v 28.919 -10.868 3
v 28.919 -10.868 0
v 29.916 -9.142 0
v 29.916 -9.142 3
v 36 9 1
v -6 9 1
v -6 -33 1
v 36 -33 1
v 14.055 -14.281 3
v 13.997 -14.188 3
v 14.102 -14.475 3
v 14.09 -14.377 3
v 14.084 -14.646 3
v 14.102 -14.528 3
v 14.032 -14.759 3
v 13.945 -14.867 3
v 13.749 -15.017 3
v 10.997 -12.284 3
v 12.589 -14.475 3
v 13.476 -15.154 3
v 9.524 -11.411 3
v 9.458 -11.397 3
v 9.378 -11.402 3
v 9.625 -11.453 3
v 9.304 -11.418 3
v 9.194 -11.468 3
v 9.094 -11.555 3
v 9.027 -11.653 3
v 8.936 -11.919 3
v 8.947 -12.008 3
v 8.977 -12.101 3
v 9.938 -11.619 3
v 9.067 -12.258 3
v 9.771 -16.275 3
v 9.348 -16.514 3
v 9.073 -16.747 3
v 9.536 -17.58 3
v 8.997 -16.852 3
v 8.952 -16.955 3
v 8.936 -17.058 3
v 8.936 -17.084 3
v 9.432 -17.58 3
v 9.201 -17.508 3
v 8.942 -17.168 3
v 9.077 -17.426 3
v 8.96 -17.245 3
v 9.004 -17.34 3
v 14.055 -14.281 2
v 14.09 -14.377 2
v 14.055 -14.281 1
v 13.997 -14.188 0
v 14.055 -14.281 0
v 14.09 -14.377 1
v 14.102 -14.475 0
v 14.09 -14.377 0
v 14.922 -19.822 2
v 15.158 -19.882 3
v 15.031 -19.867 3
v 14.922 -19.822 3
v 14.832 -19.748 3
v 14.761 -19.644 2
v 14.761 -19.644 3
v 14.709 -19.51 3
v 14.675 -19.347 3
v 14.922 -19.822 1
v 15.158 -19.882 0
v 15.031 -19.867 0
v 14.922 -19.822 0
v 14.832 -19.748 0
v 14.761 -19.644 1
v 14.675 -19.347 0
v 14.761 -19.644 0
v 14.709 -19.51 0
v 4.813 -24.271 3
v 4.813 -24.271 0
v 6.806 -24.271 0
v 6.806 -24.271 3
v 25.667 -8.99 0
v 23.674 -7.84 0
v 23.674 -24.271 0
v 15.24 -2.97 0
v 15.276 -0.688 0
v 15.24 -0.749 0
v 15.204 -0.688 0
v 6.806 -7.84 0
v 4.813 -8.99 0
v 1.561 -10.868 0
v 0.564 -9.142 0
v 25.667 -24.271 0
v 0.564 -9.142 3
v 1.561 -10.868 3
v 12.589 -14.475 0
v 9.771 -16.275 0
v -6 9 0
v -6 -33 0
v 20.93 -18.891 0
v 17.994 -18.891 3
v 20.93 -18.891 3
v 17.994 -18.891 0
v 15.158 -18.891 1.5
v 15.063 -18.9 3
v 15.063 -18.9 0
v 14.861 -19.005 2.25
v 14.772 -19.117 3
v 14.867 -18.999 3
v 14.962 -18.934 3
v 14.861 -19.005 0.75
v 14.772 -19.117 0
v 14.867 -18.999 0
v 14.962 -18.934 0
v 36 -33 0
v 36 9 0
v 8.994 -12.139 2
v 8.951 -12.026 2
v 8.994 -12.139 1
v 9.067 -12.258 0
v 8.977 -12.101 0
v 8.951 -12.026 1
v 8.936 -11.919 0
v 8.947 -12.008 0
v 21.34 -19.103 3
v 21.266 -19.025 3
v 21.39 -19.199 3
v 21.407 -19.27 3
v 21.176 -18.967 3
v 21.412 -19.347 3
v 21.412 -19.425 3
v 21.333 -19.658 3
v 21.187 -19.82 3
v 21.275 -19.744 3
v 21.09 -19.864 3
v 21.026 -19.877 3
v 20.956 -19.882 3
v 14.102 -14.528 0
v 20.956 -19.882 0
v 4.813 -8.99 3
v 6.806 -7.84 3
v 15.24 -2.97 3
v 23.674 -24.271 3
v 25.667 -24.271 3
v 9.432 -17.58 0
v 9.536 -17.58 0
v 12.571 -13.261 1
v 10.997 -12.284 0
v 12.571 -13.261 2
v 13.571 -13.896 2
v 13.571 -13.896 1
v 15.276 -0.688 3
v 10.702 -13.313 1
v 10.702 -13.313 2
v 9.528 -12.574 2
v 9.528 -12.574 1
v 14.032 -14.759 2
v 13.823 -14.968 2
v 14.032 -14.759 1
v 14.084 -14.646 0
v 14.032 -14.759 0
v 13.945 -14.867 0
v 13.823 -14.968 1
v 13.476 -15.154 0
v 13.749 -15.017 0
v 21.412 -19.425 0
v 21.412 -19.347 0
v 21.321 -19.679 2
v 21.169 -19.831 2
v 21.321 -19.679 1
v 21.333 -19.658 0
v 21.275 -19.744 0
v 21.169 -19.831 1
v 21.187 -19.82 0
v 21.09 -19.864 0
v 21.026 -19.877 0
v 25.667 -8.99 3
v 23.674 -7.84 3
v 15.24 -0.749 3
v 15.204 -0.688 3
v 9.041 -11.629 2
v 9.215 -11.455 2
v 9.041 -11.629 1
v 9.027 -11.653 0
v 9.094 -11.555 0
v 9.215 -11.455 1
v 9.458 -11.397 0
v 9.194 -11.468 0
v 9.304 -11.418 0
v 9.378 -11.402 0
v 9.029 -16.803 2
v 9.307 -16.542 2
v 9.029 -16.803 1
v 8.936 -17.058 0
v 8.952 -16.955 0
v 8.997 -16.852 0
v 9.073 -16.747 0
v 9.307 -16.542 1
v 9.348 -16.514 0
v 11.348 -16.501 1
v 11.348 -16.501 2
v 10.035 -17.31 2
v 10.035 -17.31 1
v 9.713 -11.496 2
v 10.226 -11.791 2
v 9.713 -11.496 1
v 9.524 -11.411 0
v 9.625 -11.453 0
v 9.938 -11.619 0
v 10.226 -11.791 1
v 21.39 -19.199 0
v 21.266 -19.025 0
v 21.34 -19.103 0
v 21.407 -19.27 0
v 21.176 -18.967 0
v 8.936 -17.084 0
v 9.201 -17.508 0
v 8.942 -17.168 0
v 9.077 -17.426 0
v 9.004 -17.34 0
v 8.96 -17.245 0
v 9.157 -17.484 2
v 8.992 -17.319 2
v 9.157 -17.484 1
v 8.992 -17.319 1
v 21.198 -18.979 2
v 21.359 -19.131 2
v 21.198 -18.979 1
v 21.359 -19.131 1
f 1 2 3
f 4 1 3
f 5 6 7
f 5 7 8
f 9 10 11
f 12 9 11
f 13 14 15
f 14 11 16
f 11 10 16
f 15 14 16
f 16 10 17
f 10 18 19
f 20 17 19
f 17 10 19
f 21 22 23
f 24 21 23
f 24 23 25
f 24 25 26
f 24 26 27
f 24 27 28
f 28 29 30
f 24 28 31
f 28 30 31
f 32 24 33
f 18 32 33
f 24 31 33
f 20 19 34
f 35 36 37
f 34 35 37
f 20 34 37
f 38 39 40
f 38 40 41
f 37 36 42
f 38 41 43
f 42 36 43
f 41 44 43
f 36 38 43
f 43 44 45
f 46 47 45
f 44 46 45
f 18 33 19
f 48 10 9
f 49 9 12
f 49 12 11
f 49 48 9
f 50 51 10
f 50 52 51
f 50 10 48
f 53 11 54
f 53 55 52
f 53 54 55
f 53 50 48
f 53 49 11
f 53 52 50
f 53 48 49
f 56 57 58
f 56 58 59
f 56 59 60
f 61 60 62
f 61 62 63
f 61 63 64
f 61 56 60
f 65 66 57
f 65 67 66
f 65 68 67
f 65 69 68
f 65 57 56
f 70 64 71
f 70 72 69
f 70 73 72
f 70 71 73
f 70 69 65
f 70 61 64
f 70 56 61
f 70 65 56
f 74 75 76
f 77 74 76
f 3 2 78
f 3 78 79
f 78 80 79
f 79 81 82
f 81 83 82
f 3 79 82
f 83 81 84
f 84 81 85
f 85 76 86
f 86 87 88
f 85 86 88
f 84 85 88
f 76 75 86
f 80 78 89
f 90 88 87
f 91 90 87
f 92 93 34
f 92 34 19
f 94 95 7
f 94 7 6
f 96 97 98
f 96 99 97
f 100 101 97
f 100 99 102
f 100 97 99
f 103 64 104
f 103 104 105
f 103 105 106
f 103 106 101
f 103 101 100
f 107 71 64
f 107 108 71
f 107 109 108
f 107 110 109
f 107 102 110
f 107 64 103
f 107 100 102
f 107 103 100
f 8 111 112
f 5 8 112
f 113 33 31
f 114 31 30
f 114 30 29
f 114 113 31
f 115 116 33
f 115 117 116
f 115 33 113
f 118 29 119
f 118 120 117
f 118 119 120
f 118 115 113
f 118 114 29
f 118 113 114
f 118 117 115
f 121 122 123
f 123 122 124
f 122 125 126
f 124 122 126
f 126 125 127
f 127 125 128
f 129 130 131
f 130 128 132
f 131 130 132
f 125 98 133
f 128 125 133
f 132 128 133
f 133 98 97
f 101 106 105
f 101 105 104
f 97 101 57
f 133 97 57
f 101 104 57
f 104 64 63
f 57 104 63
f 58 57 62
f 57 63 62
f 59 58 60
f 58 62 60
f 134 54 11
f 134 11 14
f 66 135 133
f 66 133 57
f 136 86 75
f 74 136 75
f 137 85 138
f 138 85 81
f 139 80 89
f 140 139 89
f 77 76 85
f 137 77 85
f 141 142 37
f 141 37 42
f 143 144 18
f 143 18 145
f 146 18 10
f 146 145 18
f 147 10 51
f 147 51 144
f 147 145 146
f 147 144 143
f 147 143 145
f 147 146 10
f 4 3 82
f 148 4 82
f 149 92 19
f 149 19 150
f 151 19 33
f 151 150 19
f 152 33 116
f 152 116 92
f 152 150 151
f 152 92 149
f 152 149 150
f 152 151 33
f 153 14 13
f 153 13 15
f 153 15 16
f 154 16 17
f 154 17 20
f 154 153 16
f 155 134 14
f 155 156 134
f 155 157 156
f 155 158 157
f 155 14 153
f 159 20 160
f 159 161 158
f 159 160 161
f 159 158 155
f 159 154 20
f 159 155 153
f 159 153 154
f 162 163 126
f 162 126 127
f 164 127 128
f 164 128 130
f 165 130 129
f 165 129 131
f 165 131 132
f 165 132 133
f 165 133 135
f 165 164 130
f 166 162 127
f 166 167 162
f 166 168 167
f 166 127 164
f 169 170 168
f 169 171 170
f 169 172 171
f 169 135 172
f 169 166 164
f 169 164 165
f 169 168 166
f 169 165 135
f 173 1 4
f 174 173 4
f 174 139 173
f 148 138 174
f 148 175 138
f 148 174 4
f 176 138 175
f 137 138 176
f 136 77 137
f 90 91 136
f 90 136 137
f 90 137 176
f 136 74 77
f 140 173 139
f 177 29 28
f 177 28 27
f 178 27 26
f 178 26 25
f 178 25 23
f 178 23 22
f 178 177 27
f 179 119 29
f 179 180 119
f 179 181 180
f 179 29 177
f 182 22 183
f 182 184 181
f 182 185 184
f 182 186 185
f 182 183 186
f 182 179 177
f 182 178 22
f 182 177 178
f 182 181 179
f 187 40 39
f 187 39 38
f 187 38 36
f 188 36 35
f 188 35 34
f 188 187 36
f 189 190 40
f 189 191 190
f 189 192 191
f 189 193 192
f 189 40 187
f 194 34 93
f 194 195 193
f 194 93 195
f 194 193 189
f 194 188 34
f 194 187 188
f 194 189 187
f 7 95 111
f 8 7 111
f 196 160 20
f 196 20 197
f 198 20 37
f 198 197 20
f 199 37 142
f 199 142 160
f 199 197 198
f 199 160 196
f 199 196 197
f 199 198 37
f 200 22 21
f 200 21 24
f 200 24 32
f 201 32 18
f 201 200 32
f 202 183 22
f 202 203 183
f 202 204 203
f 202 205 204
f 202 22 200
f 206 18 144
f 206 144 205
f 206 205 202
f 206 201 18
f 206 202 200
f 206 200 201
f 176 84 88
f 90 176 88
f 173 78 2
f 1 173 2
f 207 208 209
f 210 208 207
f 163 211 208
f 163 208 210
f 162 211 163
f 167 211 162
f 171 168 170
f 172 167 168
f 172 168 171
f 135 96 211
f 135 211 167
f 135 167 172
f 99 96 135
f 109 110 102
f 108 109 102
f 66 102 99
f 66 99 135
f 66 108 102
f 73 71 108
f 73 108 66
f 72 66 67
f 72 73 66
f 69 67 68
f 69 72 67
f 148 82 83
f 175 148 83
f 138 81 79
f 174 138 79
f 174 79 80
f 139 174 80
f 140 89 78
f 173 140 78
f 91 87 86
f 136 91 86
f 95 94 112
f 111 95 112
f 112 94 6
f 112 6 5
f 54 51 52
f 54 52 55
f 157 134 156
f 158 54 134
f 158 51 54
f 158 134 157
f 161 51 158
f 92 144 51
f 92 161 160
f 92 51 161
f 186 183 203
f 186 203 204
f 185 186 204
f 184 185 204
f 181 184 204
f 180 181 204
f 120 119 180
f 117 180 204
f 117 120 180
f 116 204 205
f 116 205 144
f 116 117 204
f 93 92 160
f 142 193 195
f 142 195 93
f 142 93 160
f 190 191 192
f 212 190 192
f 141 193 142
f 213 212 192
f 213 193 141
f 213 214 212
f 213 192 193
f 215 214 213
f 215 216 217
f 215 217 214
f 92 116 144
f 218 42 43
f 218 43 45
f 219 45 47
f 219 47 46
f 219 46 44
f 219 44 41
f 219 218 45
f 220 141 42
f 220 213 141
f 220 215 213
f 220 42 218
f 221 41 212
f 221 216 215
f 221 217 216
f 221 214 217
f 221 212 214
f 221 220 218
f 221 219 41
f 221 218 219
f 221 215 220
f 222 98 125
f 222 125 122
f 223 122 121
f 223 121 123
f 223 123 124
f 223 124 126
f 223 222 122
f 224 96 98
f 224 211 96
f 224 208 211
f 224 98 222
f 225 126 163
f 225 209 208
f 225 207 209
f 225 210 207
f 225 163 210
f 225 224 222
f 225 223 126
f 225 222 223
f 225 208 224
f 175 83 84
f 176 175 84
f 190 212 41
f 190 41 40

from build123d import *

# Parameters (mm, degrees)
EXTRUDE_DEPTH    = 3
EXTRUDE001_DEPTH = 3
EXTRUDE003_DEPTH = 3
BOX_W            = 42
BOX_H            = 42
BOX_DEPTH        = 1


with BuildPart() as extrude_body:
    # rect2864_9 → Extrude (new body)
    with BuildSketch(Plane(origin=(15.24, -12.479585, 0), x_dir=(0, 1, 0), z_dir=(0, 0, 1))):
        with BuildLine():
            add(Edge.make_bspline(
                [(11.791526, 0.035526), (3.337864, 14.675555)],
                knots=[0, 0, 327.152698, 327.152698], degree=1))
            add(Edge.make_bspline(
                [(3.337864, 14.675555), (1.611605, 13.679207)],
                knots=[0, 0, 38.571286, 38.571286], degree=1))
            add(Edge.make_bspline(
                [(1.611605, 13.679207), (3.489659, 10.426943)],
                knots=[0, 0, 72.677349, 72.677349], degree=1))
            add(Edge.make_bspline(
                [(3.489659, 10.426943), (-11.791526, 10.426943)],
                knots=[0, 0, 295.71875, 295.71875], degree=1))
            add(Edge.make_bspline(
                [(-11.791526, 10.426943), (-11.791526, 8.434246)],
                knots=[0, 0, 38.5625, 38.5625], degree=1))
            add(Edge.make_bspline(
                [(-11.791526, 8.434246), (4.639421, 8.434246)],
                knots=[0, 0, 317.96875, 317.96875], degree=1))
            add(Edge.make_bspline(
                [(4.639421, 8.434246), (9.509764, 0)],
                knots=[0, 0, 188.476584, 188.476584], degree=1))
            add(Edge.make_bspline(
                [(9.509764, 0), (4.639421, -8.434246)],
                knots=[0, 0, 188.476584, 188.476584], degree=1))
            add(Edge.make_bspline(
                [(4.639421, -8.434246), (-11.791526, -8.434246)],
                knots=[0, 0, 317.96875, 317.96875], degree=1))
            add(Edge.make_bspline(
                [(-11.791526, -8.434246), (-11.791526, -10.426943)],
                knots=[0, 0, 38.5625, 38.5625], degree=1))
            add(Edge.make_bspline(
                [(-11.791526, -10.426943), (3.489659, -10.426943)],
                knots=[0, 0, 295.71875, 295.71875], degree=1))
            add(Edge.make_bspline(
                [(3.489659, -10.426943), (1.611605, -13.679207)],
                knots=[0, 0, 72.677349, 72.677349], degree=1))
            add(Edge.make_bspline(
                [(1.611605, -13.679207), (3.337864, -14.675555)],
                knots=[0, 0, 38.571286, 38.571286], degree=1))
            add(Edge.make_bspline(
                [(3.337864, -14.675555), (11.791526, -0.035526)],
                knots=[0, 0, 327.152698, 327.152698], degree=1))
            add(Edge.make_bspline(
                [(11.791526, -0.035526), (11.730163, 0)],
                knots=[0, 0, 1.372156, 1.372156], degree=1))
            add(Edge.make_bspline(
                [(11.730163, 0), (11.791526, 0.035526)],
                knots=[0, 0, 1.372156, 1.372156], degree=1))
        make_face()
    extrude(amount=EXTRUDE_DEPTH)


with BuildPart() as extrude001:
    # path2994 → Extrude001 (new body)
    with BuildSketch(Plane(origin=(11.51903, -14.488449, 0), x_dir=(0, -1, 0), z_dir=(0, 0, -1))):
        with BuildLine():
            add(Edge.make_bspline(
                [(-3.09126, 2.06083), (-3.091253, 1.934747), (-2.795606, 1.421714), (-2.204317, 0.521729)],
                knots=[0, 0, 0, 0, 1, 1, 1, 1], degree=3))
            add(Edge.make_bspline(
                [(-2.204317, 0.521729), (-1.056502, -1.339101), (-0.421729, -2.339081), (-0.299997, -2.478215)],
                knots=[0, 0, 0, 0, 1, 1, 1, 1], degree=3))
            add(Edge.make_bspline(
                [(-0.299997, -2.478215), (-0.208689, -2.547772), (-0.113038, -2.582555), (-0.013044, -2.582561)],
                knots=[0, 0, 0, 0, 1, 1, 1, 1], degree=3))
            add(Edge.make_bspline(
                [(-0.013044, -2.582561), (0.039129, -2.582561)],
                knots=[0, 0, 0.78125, 0.78125], degree=1))
            add(Edge.make_bspline(
                [(0.039129, -2.582561), (0.282608, -2.582555), (0.491301, -2.373863), (0.665207, -1.956485)],
                knots=[0, 0, 0, 0, 1, 1, 1, 1], degree=3))
            add(Edge.make_bspline(
                [(0.665207, -1.956485), (2.282577, 0.578253), (3.09126, 1.891269), (3.091259, 1.982571)],
                knots=[0, 0, 0, 0, 1, 1, 1, 1], degree=3))
            add(Edge.make_bspline(
                [(3.091259, 1.982571), (3.091259, 2.086917)],
                knots=[0, 0, 1.5625, 1.5625], degree=1))
            add(Edge.make_bspline(
                [(3.091259, 2.086917), (3.030392, 2.417346), (2.865177, 2.582561), (2.595614, 2.582559)],
                knots=[0, 0, 0, 0, 1, 1, 1, 1], degree=3))
            add(Edge.make_bspline(
                [(2.595614, 2.582559), (2.569528, 2.582559)],
                knots=[0, 0, 0.39063, 0.39063], degree=1))
            add(Edge.make_bspline(
                [(2.569528, 2.582559), (2.317359, 2.582561), (2.056494, 2.304305), (1.78693, 1.747792)],
                knots=[0, 0, 0, 0, 1, 1, 1, 1], degree=3))
            add(Edge.make_bspline(
                [(1.78693, 1.747792), (-0.013044, -1.069546)],
                knots=[0, 0, 50.062519, 50.062519], degree=1))
            add(Edge.make_bspline(
                [(-0.013044, -1.069546), (-1.386932, 1.173893), (-2.126051, 2.347783), (-2.230404, 2.452127)],
                knots=[0, 0, 0, 0, 1, 1, 1, 1], degree=3))
            add(Edge.make_bspline(
                [(-2.230404, 2.452127), (-2.352135, 2.539083), (-2.465176, 2.582561), (-2.569529, 2.582559)],
                knots=[0, 0, 0, 0, 1, 1, 1, 1], degree=3))
            add(Edge.make_bspline(
                [(-2.569529, 2.582559), (-2.917343, 2.512996), (-3.091253, 2.339087), (-3.09126, 2.06083)],
                knots=[0, 0, 0, 0, 1, 1, 1, 1], degree=3))
        make_face()
    extrude(amount=-EXTRUDE001_DEPTH)


with BuildPart() as extrude003:
    # path2996 → Extrude003 (new body)
    with BuildSketch(Plane(origin=(18.043908, -19.386204, 0), x_dir=(0, -1, 0), z_dir=(0, 0, -1))):
        with BuildLine():
            add(Edge.make_bspline(
                [(-0.495645, 2.885815), (-0.495645, -2.885815)],
                knots=[0, 0, 86.42578, 86.42578], degree=1))
            add(Edge.make_bspline(
                [(-0.495645, -2.885815), (-0.439124, -3.207542), (-0.286953, -3.368408), (-0.039129, -3.368414)],
                knots=[0, 0, 0, 0, 1, 1, 1, 1], degree=3))
            add(Edge.make_bspline(
                [(-0.039129, -3.368414), (0.03913, -3.368414)],
                knots=[0, 0, 1.17187, 1.17187], degree=1))
            add(Edge.make_bspline(
                [(0.03913, -3.368414), (0.343473, -3.307539), (0.495644, -3.155369), (0.495645, -2.911901)],
                knots=[0, 0, 0, 0, 1, 1, 1, 1], degree=3))
            add(Edge.make_bspline(
                [(0.495645, -2.911901), (0.495645, 2.885815)],
                knots=[0, 0, 86.8164, 86.8164], degree=1))
            add(Edge.make_bspline(
                [(0.495645, 2.885815), (0.495644, 3.159723), (0.317386, 3.32059), (-0.039129, 3.368414)],
                knots=[0, 0, 0, 0, 1, 1, 1, 1], degree=3))
            add(Edge.make_bspline(
                [(-0.039129, 3.368414), (-0.343473, 3.28146), (-0.495645, 3.120594), (-0.495645, 2.885815)],
                knots=[0, 0, 0, 0, 1, 1, 1, 1], degree=3))
        make_face()
    extrude(amount=-EXTRUDE003_DEPTH)


with BuildPart() as cube:
    # Box → Box (new body)
    with BuildSketch(Plane(origin=(-6, -33, 0), x_dir=(1, 0, 0), z_dir=(0, 0, 1))):
        with Locations((21, 21)):
            Rectangle(BOX_W, BOX_H)
    extrude(amount=BOX_DEPTH)


solid = Compound([extrude_body.part, extrude001.part, extrude003.part, cube.part])
